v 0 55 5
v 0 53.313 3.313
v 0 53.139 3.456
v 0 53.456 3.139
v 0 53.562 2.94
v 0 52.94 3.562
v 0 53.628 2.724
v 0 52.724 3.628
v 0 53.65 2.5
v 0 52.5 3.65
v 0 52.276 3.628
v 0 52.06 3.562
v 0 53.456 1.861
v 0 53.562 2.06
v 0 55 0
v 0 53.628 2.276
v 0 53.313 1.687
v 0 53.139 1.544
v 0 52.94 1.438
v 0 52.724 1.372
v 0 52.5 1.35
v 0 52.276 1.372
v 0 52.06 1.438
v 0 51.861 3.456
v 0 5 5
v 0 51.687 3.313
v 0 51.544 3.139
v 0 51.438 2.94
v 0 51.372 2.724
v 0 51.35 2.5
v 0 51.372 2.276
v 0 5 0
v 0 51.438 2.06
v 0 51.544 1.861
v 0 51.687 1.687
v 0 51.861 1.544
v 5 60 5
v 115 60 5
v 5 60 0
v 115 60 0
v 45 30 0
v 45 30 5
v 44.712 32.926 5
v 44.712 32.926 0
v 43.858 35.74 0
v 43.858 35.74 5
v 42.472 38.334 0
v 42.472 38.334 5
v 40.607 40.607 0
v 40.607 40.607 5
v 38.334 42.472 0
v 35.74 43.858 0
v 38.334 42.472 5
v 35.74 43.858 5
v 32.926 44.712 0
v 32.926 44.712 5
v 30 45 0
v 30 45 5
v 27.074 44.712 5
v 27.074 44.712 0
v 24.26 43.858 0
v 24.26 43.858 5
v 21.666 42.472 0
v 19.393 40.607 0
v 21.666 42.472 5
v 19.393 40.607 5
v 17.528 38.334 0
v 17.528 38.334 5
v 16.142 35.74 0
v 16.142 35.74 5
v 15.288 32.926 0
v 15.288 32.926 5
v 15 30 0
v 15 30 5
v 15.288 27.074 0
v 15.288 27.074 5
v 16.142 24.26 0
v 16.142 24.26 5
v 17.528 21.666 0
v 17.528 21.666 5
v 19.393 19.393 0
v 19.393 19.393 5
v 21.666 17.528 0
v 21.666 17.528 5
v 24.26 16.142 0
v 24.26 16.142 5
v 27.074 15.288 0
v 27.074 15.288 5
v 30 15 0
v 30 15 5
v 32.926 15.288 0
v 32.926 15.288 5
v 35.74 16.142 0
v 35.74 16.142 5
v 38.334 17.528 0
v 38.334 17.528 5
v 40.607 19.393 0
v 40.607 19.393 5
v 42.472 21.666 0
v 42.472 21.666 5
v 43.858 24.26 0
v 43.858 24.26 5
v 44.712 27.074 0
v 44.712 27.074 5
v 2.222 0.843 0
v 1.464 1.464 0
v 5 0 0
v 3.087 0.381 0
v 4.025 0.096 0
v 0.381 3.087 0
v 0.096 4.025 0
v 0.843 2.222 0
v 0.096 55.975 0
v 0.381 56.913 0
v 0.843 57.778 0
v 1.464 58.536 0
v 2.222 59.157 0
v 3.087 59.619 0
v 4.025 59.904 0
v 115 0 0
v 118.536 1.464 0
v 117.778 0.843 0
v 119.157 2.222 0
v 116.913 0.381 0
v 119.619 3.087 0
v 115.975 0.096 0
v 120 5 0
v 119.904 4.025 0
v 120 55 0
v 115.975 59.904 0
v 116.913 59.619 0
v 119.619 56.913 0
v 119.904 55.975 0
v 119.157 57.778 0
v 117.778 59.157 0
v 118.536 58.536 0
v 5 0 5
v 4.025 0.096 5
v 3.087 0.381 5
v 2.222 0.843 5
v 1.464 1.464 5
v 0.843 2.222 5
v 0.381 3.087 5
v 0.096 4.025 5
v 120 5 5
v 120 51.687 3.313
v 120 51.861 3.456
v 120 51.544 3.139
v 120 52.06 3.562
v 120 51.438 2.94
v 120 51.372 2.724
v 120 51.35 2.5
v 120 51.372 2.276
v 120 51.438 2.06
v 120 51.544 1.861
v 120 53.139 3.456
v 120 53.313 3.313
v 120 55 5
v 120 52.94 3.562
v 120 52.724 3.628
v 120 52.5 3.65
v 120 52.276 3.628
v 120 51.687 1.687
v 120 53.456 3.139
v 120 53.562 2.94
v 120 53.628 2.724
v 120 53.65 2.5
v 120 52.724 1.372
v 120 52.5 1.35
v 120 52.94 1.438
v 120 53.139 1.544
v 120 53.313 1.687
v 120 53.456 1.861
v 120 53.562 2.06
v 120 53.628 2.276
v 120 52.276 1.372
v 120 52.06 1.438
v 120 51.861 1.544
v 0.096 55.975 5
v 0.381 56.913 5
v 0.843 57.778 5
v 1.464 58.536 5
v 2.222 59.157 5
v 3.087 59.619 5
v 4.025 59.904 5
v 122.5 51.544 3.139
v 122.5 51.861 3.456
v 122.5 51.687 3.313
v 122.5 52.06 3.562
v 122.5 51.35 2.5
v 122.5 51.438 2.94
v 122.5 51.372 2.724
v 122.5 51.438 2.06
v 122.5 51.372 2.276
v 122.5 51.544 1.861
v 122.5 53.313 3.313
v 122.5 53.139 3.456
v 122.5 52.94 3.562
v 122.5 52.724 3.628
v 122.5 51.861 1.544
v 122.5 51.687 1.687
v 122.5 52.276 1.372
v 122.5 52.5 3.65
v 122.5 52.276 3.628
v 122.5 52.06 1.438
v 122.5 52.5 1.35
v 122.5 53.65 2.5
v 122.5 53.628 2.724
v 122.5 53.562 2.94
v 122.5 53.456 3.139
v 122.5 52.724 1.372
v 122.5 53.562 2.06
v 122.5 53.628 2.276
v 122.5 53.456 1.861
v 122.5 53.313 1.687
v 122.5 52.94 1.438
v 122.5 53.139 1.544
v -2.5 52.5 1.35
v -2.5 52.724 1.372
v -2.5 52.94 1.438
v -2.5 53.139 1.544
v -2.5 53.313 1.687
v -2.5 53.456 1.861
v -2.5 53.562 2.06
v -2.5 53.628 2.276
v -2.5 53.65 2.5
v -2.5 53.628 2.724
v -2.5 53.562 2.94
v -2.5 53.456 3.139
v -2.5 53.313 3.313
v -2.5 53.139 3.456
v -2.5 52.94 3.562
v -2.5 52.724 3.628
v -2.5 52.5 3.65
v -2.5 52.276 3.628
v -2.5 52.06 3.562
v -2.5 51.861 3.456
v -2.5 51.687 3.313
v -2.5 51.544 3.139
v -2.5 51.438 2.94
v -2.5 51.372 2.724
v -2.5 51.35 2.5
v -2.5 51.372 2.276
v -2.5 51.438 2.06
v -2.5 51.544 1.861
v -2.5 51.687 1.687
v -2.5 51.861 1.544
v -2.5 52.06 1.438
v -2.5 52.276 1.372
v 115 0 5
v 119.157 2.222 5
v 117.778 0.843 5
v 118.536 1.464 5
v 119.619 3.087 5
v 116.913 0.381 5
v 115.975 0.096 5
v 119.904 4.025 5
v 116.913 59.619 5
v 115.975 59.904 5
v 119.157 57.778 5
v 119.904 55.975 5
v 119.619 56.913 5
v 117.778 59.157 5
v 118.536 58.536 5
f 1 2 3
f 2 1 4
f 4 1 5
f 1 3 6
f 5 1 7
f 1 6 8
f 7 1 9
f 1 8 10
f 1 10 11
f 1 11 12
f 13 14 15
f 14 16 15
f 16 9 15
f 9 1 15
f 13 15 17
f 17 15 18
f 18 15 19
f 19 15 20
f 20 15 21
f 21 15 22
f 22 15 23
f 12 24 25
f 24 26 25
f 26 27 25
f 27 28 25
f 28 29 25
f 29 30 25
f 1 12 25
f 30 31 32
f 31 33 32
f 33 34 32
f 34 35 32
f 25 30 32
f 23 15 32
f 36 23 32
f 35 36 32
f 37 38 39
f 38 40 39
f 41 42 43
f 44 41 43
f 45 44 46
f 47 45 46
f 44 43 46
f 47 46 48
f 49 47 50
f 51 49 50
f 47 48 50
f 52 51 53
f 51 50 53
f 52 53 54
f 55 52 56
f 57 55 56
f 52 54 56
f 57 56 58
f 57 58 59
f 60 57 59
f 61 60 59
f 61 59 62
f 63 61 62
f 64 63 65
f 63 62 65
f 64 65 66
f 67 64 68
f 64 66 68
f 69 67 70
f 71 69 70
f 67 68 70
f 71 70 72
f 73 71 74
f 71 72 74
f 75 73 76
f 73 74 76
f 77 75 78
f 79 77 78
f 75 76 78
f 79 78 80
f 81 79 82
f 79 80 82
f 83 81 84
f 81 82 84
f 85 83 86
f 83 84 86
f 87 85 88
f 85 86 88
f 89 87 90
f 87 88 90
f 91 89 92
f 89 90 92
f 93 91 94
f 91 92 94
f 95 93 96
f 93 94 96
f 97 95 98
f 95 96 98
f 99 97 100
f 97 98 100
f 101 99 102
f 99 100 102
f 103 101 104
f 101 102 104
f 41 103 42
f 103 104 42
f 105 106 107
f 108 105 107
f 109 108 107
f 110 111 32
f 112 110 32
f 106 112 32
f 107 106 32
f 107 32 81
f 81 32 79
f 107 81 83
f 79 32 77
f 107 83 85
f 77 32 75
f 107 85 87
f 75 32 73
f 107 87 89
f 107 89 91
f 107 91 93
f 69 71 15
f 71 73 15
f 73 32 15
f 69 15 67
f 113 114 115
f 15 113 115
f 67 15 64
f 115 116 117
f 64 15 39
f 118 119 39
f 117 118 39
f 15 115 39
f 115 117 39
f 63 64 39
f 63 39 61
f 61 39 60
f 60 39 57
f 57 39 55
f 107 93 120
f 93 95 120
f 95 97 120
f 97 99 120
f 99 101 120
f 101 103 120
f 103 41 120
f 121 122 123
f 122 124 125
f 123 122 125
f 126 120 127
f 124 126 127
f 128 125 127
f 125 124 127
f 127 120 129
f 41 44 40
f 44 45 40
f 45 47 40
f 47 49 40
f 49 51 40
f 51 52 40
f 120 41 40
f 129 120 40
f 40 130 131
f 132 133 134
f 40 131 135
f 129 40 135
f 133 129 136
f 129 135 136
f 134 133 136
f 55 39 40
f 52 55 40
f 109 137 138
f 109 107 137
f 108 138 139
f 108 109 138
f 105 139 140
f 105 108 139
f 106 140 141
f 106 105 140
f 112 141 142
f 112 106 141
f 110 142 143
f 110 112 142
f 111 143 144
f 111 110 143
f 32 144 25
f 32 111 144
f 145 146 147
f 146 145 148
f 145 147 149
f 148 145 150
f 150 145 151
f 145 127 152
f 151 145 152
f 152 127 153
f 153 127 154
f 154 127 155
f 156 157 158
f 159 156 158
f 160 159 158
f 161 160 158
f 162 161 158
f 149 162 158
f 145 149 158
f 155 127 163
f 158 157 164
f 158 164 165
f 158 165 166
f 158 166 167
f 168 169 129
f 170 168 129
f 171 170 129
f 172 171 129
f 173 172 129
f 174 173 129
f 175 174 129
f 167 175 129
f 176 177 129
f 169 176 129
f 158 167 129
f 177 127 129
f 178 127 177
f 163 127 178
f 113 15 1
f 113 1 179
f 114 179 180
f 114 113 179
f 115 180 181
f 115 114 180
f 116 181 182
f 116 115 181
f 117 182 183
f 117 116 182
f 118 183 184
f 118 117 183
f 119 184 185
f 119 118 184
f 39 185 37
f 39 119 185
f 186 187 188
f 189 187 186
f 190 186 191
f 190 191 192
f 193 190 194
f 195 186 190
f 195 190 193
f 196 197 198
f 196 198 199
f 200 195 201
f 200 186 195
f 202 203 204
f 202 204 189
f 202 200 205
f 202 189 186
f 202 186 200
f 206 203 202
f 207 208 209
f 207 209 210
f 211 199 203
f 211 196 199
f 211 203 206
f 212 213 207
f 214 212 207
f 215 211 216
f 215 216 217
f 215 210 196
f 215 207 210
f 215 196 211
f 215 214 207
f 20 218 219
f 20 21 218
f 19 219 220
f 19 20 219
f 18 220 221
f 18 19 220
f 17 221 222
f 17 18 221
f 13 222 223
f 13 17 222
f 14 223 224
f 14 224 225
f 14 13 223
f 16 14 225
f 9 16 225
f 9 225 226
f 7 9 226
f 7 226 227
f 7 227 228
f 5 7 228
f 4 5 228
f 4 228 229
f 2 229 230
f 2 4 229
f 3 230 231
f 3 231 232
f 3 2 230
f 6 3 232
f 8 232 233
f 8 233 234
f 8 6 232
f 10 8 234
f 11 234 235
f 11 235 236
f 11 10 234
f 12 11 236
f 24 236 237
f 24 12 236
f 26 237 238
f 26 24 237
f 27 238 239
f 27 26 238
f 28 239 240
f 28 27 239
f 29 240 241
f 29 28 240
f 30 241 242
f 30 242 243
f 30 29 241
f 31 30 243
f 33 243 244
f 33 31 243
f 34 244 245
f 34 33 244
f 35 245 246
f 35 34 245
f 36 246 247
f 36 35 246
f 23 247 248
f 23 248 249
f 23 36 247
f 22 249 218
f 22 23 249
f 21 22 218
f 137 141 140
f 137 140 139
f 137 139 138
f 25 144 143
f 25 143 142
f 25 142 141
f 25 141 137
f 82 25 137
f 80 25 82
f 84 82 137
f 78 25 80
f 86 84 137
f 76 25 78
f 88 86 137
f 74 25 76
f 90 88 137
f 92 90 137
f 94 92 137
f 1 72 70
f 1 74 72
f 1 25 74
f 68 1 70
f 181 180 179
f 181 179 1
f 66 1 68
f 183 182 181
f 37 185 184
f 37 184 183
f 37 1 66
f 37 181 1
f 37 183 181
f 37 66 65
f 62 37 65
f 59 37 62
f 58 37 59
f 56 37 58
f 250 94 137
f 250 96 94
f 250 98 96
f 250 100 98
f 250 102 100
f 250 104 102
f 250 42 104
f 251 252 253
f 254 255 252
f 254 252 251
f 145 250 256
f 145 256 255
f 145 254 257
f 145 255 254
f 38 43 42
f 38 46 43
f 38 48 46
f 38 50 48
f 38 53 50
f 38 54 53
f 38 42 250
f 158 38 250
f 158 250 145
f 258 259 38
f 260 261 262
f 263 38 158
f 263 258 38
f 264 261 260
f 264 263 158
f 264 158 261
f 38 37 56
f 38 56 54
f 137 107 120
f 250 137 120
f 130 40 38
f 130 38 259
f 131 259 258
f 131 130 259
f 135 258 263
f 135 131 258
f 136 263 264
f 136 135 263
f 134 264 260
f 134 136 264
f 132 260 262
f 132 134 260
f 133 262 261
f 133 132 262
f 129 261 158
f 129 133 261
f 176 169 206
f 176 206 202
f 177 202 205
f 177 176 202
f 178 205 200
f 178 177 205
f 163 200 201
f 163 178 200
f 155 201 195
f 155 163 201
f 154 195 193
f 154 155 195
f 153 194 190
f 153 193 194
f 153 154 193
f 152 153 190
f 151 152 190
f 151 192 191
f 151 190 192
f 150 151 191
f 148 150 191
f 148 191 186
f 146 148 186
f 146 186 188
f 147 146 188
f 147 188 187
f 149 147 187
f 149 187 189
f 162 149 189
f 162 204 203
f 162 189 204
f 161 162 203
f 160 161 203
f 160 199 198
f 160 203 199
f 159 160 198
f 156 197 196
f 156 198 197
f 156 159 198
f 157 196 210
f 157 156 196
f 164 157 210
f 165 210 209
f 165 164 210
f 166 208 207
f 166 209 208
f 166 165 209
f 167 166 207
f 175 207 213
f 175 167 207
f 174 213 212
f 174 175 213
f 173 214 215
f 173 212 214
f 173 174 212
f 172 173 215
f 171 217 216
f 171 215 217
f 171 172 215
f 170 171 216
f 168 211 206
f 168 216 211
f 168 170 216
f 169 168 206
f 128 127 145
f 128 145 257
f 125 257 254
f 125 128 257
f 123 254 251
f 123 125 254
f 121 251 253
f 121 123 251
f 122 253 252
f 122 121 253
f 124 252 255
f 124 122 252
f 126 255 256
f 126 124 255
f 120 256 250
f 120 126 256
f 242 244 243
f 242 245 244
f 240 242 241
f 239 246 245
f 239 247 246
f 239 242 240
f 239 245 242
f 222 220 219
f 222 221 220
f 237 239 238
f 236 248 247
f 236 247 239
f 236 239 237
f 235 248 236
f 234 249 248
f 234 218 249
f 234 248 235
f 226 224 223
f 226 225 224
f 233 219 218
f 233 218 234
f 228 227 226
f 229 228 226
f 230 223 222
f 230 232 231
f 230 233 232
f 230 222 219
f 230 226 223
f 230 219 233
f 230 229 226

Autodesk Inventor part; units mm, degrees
ref_plane "YZ Plane" through (0, 0, 0) normal (1, 0, 0) x (0, 1, 0)
ref_plane "XZ Plane" through (0, 0, 0) normal (0, 1, 0) x (-1, 0, 0)
sketch "Boceto1" plane through (0, 0, 0) normal (0, 0, 1) x (1, 0, 0)
  line L0 (5, 0) -> (115, 0)
  line L1 (120, 5) -> (120, 55)
  line L2 (115, 60) -> (5, 60)
  line L3 (0, 55) -> (0, 5)
  arc A0 (5, 60) -> (0, 55) centre (5, 55) ccw
  arc A1 (120, 55) -> (115, 60) centre (115, 55) ccw
  arc A2 (115, 0) -> (120, 5) centre (115, 5) ccw
  arc A3 (0, 5) -> (5, 0) centre (5, 5) ccw
  point P0 (0, 0)
  point P1 (120, 60)
  point P2 (120, 0)
  point P3 (0, 60)
  dimension "d0" = 120
  dimension "d1" = 60
  dimension "d2" = 5
extrude "Extrusión1" add sketch "Boceto1" along normal blind 5
sketch "Boceto2" plane through (120, 5, 0) normal (1, 0, 0) x (0, 0, -1)
  point P0 (0, -5)
sketch "Boceto3" plane through (120, 5, 0) normal (1, 0, 0) x (0, 0, -1)
  circle A0 centre (-2.5, 47.5) radius 1.15
  line L0 (-5, 0) -> (-5, 50) projected
  line L1 (0, 50) -> (-5, 50) projected
  point P0 (0, -5)
  dimension "d5" = 2.3
  dimension "d6" = 2.5
  dimension "d7" = 2.5
extrude "Extrusión2" add sketch "Boceto3" along normal blind 2.5
ref_plane "Plano de trabajo1" through (60, 5, 0) normal (1, 0, 0) x (0, 0, -1)
mirror "Simetría1" about plane through (60, 5, 0) normal (1, 0, 0) of "Extrusión2"
sketch "Boceto4" plane through (0, 0, 5) normal (0, 0, 1) x (1, 0, 0)
  circle A0 centre (30, 30) radius 15
  line L0 (0, 55) -> (0, 5) projected
  point P0 (0, 0)
  point P1 (0, 30)
  dimension "d10" = 30
  dimension "d11" = 30
extrude "Extrusión3" cut sketch "Boceto4" against normal through all
properties part number "Puerta" material "Plástico ABS"
